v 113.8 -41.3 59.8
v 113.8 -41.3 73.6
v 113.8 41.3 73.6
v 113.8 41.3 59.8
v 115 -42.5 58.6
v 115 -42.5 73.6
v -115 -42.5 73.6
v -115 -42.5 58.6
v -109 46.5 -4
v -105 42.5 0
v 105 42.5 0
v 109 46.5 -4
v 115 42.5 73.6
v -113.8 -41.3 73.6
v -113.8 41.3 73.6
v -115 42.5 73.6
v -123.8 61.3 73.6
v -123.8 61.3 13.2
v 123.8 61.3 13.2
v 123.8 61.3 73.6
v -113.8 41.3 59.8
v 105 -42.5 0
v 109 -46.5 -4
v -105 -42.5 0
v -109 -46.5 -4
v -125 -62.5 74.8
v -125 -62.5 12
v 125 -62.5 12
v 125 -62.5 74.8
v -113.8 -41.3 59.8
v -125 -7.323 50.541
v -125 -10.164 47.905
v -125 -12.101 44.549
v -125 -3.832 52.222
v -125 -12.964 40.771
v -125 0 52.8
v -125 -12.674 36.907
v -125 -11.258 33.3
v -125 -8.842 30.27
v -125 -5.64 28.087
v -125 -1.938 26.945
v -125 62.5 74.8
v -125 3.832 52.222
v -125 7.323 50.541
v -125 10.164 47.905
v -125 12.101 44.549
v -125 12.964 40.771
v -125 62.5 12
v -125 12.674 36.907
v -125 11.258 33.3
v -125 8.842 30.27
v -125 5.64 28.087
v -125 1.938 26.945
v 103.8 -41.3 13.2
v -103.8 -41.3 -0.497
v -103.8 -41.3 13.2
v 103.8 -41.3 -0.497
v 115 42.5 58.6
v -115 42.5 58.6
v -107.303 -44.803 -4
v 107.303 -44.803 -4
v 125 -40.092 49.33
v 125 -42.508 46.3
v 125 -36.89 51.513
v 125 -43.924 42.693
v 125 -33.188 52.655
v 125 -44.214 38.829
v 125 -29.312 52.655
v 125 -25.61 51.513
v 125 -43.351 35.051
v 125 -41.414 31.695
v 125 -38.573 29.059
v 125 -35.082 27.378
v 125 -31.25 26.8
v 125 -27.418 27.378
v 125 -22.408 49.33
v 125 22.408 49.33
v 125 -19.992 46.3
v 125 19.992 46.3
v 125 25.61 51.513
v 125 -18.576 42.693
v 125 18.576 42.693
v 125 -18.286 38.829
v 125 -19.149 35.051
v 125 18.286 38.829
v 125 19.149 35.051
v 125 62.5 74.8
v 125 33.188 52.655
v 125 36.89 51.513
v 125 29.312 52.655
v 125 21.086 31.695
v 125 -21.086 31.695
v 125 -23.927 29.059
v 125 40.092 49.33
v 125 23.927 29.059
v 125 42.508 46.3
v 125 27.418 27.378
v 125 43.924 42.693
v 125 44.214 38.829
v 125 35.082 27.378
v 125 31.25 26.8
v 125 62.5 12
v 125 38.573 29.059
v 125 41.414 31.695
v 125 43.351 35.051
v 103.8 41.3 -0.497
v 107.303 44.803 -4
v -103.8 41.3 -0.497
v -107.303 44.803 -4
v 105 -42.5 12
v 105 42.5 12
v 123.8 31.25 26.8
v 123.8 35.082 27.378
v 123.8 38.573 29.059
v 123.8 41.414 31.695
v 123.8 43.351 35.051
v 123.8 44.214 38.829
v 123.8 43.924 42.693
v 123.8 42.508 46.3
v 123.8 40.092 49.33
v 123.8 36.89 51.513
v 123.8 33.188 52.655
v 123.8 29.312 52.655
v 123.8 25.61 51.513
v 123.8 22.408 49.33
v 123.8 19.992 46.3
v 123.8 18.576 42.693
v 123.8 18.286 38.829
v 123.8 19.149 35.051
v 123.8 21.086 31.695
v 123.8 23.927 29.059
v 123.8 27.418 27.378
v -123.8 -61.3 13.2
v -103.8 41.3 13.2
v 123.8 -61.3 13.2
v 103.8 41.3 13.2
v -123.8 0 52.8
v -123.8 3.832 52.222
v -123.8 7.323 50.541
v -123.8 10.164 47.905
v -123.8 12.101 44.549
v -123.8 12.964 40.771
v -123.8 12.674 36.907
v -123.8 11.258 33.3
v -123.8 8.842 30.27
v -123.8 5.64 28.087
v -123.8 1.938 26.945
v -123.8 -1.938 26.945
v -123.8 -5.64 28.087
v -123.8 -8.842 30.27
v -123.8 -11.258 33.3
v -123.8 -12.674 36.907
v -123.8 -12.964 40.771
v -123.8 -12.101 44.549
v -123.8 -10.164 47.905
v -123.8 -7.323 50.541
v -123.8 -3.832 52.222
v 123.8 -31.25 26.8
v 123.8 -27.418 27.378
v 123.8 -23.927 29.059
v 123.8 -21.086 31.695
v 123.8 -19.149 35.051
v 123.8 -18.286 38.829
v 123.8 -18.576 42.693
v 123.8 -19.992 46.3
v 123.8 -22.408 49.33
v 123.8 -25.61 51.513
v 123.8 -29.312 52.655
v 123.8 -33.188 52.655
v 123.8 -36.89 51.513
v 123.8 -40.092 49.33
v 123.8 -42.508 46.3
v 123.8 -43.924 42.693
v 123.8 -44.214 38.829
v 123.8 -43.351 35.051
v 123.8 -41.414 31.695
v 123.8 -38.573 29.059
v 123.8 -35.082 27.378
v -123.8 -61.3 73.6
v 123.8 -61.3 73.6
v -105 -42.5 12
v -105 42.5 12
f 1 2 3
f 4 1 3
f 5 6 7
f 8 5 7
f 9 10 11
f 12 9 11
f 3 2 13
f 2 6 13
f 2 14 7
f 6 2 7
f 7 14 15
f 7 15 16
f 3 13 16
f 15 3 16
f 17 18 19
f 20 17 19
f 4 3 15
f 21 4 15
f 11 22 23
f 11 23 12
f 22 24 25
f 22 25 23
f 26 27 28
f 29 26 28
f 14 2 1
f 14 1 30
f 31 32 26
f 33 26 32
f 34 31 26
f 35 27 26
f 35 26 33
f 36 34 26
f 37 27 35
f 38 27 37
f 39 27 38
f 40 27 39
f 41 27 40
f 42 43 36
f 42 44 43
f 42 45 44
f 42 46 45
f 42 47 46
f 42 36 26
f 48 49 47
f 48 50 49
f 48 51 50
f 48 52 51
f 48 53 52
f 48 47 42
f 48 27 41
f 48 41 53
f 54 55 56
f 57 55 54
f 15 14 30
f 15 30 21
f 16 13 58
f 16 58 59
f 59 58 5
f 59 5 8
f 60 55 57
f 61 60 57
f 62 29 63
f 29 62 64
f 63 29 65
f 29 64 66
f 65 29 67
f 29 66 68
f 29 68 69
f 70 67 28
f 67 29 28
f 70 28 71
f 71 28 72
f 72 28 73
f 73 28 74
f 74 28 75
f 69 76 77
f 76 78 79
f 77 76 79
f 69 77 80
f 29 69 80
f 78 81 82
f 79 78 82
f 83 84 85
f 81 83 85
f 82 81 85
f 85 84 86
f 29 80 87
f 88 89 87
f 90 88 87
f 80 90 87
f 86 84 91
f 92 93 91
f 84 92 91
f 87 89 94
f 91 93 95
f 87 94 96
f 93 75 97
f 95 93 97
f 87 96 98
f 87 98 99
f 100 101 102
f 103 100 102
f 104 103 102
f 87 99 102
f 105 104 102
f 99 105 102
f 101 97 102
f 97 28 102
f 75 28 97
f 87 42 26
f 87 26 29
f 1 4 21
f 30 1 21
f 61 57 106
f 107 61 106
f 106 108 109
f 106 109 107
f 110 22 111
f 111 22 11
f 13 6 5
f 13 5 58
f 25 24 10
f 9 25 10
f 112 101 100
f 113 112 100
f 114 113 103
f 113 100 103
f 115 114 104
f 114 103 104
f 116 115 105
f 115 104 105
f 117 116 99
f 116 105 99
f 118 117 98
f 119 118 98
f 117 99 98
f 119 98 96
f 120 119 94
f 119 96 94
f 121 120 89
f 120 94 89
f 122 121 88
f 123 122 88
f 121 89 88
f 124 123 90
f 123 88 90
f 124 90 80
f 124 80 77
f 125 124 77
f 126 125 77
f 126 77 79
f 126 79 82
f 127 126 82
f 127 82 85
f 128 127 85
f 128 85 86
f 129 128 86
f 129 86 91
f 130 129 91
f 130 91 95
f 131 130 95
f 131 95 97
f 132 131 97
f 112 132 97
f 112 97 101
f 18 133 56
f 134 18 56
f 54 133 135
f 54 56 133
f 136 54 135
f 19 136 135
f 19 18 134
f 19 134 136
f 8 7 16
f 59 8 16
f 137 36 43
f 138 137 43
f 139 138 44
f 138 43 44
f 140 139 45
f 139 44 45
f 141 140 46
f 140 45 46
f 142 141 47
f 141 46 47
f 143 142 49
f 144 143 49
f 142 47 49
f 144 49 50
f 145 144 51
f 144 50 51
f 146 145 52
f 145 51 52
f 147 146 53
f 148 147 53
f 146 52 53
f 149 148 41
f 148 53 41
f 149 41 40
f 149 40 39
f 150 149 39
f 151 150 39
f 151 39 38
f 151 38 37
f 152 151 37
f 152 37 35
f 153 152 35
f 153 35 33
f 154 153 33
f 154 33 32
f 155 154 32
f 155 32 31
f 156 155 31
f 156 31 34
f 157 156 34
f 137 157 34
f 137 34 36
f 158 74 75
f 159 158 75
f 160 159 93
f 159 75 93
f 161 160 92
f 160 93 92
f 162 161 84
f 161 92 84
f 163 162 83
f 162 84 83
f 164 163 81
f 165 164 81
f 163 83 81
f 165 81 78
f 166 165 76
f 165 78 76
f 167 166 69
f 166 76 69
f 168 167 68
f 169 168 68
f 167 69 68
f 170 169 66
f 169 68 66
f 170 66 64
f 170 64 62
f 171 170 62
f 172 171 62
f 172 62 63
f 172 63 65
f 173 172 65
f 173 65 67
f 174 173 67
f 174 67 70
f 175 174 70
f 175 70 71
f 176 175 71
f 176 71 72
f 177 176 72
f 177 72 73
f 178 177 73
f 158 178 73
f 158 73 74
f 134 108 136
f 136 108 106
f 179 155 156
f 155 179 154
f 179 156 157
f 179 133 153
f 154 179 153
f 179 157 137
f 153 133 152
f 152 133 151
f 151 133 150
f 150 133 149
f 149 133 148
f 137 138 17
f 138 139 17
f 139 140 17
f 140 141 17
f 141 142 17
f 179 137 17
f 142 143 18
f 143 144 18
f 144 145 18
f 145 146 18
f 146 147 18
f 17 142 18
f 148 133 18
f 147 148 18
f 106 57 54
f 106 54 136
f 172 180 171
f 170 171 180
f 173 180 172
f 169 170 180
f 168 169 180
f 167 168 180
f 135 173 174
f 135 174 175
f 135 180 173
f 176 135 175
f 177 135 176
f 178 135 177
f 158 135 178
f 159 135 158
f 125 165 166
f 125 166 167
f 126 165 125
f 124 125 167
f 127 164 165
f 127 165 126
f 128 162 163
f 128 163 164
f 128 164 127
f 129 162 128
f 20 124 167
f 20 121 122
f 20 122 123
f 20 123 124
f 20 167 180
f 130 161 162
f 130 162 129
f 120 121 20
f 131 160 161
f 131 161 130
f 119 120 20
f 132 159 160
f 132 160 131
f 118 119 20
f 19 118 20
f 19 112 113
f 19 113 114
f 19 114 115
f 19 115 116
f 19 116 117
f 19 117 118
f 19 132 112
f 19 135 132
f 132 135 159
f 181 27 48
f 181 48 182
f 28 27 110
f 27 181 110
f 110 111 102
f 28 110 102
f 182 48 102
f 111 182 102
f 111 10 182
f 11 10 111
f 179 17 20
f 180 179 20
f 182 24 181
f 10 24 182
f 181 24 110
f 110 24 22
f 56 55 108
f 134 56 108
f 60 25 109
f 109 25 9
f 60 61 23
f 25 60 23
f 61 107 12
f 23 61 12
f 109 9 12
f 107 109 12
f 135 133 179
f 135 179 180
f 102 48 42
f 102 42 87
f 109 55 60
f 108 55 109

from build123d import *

# Parameters (mm, degrees)
SKETCH_1_W          = 250
SKETCH_1_H          = 125
EXTRUDE_1_DEPTH     = 74.8
SKETCH_2_W          = 250
SKETCH_2_H          = 125
SKETCH_2_W_2        = 210
SKETCH_2_H_2        = 85
CUT_EXTRUDE_1_DEPTH = 12
SKETCH_3_W          = 210
SKETCH_3_H          = 85
EXTRUDE_2_DEPTH     = 4
EXTRUDE_2_DRAFT     = 45
SHELL_1_T           = -1.2
CUT_EXTRUDE_3_REACH = 270.331
SKETCH_12_R         = 13
SKETCH_13_R         = 13
CUT_EXTRUDE_4_DEPTH = 94
SKETCH_14_W         = 230
SKETCH_14_H         = 85
EXTRUDE_3_DEPTH     = 15
SHELL_2_T           = -1.2


with BuildPart() as part:
    # 草图1 → 凸台-拉伸1 (new body)
    with BuildSketch(Plane.XY):
        Rectangle(SKETCH_1_W, SKETCH_1_H)
    extrude(amount=EXTRUDE_1_DEPTH)

    # 草图2 → 切除-拉伸1 (cut)
    with BuildSketch(Plane.XY):
        Rectangle(SKETCH_2_W, SKETCH_2_H)
        Rectangle(SKETCH_2_W_2, SKETCH_2_H_2, mode=Mode.SUBTRACT)
    extrude(amount=CUT_EXTRUDE_1_DEPTH, mode=Mode.SUBTRACT)


with BuildPart() as extrude_2_tool:
    # 草图3 → 凸台-拉伸2 (with draft: the straight prism first)
    with BuildSketch(Plane.XY):
        Rectangle(SKETCH_3_W, SKETCH_3_H)
    extrude(amount=-EXTRUDE_2_DEPTH)
    # 凸台-拉伸2: the draft: its side faces are tilted about the plane it starts from
    extrude_2_sides = [extrude_2_tool.faces().sort_by_distance(p)[0] for p in [
        (0, 42.5, -2),
        (-105, 0, -2),
        (0, -42.5, -2),
        (105, 0, -2),
    ]]
    draft(extrude_2_sides, Plane.XY, EXTRUDE_2_DRAFT)


with BuildPart() as part_1:
    add(part.part)

    # 凸台-拉伸2: add extrude_2_tool
    add(extrude_2_tool.part)

    # 抽壳1
    shell_1_openings = [part_1.faces().sort_by_distance(p)[0] for p in [
        (0, 0, -4),
    ]]
    offset(amount=SHELL_1_T, openings=shell_1_openings, kind=Kind.INTERSECTION)

    # 草图12 → 切除-拉伸3 (cut, up to next)
    with BuildSketch(Plane.ZY.offset(125), mode=Mode.PRIVATE) as cut_extrude_3_sk1:
        with Locations((39.8, 0)):
            Circle(SKETCH_12_R)
    cut_extrude_3_tool1 = extrude(cut_extrude_3_sk1.sketch, amount=-CUT_EXTRUDE_3_REACH, mode=Mode.PRIVATE) & part_1.part
    add(cut_extrude_3_tool1.solids().sort_by_distance((-125, 0, 39.8))[0], mode=Mode.SUBTRACT)

    # 草图13 → 切除-拉伸4 (cut)
    with BuildSketch(Plane(origin=(125, 0, 0), x_dir=(0, 0, -1), z_dir=(1, 0, 0))):
        with Locations((-39.8, 31.25)):
            Circle(SKETCH_13_R)
        with Locations((-39.8, -31.25)):
            Circle(SKETCH_13_R)
    extrude(amount=-CUT_EXTRUDE_4_DEPTH, mode=Mode.SUBTRACT)


with BuildPart() as body_2:
    # 草图14 → 凸台-拉伸3 (new body)
    with BuildSketch(Plane(origin=(0, 0, 73.6), x_dir=(-1, 0, 0), z_dir=(0, 0, -1))):
        with Locations((400, 0)):
            Rectangle(SKETCH_14_W, SKETCH_14_H)
    extrude(amount=EXTRUDE_3_DEPTH)

    # 抽壳2
    shell_2_openings = [body_2.faces().sort_by_distance(p)[0] for p in [
        (-400, 0, 73.6),
    ]]
    offset(amount=SHELL_2_T, openings=shell_2_openings, kind=Kind.INTERSECTION)


with BuildPart() as body_2_1:
    # Move Body 1: moved
    add(body_2.part.moved(Location((400, 0, 0))))


solid = Compound([part_1.part, body_2_1.part])
